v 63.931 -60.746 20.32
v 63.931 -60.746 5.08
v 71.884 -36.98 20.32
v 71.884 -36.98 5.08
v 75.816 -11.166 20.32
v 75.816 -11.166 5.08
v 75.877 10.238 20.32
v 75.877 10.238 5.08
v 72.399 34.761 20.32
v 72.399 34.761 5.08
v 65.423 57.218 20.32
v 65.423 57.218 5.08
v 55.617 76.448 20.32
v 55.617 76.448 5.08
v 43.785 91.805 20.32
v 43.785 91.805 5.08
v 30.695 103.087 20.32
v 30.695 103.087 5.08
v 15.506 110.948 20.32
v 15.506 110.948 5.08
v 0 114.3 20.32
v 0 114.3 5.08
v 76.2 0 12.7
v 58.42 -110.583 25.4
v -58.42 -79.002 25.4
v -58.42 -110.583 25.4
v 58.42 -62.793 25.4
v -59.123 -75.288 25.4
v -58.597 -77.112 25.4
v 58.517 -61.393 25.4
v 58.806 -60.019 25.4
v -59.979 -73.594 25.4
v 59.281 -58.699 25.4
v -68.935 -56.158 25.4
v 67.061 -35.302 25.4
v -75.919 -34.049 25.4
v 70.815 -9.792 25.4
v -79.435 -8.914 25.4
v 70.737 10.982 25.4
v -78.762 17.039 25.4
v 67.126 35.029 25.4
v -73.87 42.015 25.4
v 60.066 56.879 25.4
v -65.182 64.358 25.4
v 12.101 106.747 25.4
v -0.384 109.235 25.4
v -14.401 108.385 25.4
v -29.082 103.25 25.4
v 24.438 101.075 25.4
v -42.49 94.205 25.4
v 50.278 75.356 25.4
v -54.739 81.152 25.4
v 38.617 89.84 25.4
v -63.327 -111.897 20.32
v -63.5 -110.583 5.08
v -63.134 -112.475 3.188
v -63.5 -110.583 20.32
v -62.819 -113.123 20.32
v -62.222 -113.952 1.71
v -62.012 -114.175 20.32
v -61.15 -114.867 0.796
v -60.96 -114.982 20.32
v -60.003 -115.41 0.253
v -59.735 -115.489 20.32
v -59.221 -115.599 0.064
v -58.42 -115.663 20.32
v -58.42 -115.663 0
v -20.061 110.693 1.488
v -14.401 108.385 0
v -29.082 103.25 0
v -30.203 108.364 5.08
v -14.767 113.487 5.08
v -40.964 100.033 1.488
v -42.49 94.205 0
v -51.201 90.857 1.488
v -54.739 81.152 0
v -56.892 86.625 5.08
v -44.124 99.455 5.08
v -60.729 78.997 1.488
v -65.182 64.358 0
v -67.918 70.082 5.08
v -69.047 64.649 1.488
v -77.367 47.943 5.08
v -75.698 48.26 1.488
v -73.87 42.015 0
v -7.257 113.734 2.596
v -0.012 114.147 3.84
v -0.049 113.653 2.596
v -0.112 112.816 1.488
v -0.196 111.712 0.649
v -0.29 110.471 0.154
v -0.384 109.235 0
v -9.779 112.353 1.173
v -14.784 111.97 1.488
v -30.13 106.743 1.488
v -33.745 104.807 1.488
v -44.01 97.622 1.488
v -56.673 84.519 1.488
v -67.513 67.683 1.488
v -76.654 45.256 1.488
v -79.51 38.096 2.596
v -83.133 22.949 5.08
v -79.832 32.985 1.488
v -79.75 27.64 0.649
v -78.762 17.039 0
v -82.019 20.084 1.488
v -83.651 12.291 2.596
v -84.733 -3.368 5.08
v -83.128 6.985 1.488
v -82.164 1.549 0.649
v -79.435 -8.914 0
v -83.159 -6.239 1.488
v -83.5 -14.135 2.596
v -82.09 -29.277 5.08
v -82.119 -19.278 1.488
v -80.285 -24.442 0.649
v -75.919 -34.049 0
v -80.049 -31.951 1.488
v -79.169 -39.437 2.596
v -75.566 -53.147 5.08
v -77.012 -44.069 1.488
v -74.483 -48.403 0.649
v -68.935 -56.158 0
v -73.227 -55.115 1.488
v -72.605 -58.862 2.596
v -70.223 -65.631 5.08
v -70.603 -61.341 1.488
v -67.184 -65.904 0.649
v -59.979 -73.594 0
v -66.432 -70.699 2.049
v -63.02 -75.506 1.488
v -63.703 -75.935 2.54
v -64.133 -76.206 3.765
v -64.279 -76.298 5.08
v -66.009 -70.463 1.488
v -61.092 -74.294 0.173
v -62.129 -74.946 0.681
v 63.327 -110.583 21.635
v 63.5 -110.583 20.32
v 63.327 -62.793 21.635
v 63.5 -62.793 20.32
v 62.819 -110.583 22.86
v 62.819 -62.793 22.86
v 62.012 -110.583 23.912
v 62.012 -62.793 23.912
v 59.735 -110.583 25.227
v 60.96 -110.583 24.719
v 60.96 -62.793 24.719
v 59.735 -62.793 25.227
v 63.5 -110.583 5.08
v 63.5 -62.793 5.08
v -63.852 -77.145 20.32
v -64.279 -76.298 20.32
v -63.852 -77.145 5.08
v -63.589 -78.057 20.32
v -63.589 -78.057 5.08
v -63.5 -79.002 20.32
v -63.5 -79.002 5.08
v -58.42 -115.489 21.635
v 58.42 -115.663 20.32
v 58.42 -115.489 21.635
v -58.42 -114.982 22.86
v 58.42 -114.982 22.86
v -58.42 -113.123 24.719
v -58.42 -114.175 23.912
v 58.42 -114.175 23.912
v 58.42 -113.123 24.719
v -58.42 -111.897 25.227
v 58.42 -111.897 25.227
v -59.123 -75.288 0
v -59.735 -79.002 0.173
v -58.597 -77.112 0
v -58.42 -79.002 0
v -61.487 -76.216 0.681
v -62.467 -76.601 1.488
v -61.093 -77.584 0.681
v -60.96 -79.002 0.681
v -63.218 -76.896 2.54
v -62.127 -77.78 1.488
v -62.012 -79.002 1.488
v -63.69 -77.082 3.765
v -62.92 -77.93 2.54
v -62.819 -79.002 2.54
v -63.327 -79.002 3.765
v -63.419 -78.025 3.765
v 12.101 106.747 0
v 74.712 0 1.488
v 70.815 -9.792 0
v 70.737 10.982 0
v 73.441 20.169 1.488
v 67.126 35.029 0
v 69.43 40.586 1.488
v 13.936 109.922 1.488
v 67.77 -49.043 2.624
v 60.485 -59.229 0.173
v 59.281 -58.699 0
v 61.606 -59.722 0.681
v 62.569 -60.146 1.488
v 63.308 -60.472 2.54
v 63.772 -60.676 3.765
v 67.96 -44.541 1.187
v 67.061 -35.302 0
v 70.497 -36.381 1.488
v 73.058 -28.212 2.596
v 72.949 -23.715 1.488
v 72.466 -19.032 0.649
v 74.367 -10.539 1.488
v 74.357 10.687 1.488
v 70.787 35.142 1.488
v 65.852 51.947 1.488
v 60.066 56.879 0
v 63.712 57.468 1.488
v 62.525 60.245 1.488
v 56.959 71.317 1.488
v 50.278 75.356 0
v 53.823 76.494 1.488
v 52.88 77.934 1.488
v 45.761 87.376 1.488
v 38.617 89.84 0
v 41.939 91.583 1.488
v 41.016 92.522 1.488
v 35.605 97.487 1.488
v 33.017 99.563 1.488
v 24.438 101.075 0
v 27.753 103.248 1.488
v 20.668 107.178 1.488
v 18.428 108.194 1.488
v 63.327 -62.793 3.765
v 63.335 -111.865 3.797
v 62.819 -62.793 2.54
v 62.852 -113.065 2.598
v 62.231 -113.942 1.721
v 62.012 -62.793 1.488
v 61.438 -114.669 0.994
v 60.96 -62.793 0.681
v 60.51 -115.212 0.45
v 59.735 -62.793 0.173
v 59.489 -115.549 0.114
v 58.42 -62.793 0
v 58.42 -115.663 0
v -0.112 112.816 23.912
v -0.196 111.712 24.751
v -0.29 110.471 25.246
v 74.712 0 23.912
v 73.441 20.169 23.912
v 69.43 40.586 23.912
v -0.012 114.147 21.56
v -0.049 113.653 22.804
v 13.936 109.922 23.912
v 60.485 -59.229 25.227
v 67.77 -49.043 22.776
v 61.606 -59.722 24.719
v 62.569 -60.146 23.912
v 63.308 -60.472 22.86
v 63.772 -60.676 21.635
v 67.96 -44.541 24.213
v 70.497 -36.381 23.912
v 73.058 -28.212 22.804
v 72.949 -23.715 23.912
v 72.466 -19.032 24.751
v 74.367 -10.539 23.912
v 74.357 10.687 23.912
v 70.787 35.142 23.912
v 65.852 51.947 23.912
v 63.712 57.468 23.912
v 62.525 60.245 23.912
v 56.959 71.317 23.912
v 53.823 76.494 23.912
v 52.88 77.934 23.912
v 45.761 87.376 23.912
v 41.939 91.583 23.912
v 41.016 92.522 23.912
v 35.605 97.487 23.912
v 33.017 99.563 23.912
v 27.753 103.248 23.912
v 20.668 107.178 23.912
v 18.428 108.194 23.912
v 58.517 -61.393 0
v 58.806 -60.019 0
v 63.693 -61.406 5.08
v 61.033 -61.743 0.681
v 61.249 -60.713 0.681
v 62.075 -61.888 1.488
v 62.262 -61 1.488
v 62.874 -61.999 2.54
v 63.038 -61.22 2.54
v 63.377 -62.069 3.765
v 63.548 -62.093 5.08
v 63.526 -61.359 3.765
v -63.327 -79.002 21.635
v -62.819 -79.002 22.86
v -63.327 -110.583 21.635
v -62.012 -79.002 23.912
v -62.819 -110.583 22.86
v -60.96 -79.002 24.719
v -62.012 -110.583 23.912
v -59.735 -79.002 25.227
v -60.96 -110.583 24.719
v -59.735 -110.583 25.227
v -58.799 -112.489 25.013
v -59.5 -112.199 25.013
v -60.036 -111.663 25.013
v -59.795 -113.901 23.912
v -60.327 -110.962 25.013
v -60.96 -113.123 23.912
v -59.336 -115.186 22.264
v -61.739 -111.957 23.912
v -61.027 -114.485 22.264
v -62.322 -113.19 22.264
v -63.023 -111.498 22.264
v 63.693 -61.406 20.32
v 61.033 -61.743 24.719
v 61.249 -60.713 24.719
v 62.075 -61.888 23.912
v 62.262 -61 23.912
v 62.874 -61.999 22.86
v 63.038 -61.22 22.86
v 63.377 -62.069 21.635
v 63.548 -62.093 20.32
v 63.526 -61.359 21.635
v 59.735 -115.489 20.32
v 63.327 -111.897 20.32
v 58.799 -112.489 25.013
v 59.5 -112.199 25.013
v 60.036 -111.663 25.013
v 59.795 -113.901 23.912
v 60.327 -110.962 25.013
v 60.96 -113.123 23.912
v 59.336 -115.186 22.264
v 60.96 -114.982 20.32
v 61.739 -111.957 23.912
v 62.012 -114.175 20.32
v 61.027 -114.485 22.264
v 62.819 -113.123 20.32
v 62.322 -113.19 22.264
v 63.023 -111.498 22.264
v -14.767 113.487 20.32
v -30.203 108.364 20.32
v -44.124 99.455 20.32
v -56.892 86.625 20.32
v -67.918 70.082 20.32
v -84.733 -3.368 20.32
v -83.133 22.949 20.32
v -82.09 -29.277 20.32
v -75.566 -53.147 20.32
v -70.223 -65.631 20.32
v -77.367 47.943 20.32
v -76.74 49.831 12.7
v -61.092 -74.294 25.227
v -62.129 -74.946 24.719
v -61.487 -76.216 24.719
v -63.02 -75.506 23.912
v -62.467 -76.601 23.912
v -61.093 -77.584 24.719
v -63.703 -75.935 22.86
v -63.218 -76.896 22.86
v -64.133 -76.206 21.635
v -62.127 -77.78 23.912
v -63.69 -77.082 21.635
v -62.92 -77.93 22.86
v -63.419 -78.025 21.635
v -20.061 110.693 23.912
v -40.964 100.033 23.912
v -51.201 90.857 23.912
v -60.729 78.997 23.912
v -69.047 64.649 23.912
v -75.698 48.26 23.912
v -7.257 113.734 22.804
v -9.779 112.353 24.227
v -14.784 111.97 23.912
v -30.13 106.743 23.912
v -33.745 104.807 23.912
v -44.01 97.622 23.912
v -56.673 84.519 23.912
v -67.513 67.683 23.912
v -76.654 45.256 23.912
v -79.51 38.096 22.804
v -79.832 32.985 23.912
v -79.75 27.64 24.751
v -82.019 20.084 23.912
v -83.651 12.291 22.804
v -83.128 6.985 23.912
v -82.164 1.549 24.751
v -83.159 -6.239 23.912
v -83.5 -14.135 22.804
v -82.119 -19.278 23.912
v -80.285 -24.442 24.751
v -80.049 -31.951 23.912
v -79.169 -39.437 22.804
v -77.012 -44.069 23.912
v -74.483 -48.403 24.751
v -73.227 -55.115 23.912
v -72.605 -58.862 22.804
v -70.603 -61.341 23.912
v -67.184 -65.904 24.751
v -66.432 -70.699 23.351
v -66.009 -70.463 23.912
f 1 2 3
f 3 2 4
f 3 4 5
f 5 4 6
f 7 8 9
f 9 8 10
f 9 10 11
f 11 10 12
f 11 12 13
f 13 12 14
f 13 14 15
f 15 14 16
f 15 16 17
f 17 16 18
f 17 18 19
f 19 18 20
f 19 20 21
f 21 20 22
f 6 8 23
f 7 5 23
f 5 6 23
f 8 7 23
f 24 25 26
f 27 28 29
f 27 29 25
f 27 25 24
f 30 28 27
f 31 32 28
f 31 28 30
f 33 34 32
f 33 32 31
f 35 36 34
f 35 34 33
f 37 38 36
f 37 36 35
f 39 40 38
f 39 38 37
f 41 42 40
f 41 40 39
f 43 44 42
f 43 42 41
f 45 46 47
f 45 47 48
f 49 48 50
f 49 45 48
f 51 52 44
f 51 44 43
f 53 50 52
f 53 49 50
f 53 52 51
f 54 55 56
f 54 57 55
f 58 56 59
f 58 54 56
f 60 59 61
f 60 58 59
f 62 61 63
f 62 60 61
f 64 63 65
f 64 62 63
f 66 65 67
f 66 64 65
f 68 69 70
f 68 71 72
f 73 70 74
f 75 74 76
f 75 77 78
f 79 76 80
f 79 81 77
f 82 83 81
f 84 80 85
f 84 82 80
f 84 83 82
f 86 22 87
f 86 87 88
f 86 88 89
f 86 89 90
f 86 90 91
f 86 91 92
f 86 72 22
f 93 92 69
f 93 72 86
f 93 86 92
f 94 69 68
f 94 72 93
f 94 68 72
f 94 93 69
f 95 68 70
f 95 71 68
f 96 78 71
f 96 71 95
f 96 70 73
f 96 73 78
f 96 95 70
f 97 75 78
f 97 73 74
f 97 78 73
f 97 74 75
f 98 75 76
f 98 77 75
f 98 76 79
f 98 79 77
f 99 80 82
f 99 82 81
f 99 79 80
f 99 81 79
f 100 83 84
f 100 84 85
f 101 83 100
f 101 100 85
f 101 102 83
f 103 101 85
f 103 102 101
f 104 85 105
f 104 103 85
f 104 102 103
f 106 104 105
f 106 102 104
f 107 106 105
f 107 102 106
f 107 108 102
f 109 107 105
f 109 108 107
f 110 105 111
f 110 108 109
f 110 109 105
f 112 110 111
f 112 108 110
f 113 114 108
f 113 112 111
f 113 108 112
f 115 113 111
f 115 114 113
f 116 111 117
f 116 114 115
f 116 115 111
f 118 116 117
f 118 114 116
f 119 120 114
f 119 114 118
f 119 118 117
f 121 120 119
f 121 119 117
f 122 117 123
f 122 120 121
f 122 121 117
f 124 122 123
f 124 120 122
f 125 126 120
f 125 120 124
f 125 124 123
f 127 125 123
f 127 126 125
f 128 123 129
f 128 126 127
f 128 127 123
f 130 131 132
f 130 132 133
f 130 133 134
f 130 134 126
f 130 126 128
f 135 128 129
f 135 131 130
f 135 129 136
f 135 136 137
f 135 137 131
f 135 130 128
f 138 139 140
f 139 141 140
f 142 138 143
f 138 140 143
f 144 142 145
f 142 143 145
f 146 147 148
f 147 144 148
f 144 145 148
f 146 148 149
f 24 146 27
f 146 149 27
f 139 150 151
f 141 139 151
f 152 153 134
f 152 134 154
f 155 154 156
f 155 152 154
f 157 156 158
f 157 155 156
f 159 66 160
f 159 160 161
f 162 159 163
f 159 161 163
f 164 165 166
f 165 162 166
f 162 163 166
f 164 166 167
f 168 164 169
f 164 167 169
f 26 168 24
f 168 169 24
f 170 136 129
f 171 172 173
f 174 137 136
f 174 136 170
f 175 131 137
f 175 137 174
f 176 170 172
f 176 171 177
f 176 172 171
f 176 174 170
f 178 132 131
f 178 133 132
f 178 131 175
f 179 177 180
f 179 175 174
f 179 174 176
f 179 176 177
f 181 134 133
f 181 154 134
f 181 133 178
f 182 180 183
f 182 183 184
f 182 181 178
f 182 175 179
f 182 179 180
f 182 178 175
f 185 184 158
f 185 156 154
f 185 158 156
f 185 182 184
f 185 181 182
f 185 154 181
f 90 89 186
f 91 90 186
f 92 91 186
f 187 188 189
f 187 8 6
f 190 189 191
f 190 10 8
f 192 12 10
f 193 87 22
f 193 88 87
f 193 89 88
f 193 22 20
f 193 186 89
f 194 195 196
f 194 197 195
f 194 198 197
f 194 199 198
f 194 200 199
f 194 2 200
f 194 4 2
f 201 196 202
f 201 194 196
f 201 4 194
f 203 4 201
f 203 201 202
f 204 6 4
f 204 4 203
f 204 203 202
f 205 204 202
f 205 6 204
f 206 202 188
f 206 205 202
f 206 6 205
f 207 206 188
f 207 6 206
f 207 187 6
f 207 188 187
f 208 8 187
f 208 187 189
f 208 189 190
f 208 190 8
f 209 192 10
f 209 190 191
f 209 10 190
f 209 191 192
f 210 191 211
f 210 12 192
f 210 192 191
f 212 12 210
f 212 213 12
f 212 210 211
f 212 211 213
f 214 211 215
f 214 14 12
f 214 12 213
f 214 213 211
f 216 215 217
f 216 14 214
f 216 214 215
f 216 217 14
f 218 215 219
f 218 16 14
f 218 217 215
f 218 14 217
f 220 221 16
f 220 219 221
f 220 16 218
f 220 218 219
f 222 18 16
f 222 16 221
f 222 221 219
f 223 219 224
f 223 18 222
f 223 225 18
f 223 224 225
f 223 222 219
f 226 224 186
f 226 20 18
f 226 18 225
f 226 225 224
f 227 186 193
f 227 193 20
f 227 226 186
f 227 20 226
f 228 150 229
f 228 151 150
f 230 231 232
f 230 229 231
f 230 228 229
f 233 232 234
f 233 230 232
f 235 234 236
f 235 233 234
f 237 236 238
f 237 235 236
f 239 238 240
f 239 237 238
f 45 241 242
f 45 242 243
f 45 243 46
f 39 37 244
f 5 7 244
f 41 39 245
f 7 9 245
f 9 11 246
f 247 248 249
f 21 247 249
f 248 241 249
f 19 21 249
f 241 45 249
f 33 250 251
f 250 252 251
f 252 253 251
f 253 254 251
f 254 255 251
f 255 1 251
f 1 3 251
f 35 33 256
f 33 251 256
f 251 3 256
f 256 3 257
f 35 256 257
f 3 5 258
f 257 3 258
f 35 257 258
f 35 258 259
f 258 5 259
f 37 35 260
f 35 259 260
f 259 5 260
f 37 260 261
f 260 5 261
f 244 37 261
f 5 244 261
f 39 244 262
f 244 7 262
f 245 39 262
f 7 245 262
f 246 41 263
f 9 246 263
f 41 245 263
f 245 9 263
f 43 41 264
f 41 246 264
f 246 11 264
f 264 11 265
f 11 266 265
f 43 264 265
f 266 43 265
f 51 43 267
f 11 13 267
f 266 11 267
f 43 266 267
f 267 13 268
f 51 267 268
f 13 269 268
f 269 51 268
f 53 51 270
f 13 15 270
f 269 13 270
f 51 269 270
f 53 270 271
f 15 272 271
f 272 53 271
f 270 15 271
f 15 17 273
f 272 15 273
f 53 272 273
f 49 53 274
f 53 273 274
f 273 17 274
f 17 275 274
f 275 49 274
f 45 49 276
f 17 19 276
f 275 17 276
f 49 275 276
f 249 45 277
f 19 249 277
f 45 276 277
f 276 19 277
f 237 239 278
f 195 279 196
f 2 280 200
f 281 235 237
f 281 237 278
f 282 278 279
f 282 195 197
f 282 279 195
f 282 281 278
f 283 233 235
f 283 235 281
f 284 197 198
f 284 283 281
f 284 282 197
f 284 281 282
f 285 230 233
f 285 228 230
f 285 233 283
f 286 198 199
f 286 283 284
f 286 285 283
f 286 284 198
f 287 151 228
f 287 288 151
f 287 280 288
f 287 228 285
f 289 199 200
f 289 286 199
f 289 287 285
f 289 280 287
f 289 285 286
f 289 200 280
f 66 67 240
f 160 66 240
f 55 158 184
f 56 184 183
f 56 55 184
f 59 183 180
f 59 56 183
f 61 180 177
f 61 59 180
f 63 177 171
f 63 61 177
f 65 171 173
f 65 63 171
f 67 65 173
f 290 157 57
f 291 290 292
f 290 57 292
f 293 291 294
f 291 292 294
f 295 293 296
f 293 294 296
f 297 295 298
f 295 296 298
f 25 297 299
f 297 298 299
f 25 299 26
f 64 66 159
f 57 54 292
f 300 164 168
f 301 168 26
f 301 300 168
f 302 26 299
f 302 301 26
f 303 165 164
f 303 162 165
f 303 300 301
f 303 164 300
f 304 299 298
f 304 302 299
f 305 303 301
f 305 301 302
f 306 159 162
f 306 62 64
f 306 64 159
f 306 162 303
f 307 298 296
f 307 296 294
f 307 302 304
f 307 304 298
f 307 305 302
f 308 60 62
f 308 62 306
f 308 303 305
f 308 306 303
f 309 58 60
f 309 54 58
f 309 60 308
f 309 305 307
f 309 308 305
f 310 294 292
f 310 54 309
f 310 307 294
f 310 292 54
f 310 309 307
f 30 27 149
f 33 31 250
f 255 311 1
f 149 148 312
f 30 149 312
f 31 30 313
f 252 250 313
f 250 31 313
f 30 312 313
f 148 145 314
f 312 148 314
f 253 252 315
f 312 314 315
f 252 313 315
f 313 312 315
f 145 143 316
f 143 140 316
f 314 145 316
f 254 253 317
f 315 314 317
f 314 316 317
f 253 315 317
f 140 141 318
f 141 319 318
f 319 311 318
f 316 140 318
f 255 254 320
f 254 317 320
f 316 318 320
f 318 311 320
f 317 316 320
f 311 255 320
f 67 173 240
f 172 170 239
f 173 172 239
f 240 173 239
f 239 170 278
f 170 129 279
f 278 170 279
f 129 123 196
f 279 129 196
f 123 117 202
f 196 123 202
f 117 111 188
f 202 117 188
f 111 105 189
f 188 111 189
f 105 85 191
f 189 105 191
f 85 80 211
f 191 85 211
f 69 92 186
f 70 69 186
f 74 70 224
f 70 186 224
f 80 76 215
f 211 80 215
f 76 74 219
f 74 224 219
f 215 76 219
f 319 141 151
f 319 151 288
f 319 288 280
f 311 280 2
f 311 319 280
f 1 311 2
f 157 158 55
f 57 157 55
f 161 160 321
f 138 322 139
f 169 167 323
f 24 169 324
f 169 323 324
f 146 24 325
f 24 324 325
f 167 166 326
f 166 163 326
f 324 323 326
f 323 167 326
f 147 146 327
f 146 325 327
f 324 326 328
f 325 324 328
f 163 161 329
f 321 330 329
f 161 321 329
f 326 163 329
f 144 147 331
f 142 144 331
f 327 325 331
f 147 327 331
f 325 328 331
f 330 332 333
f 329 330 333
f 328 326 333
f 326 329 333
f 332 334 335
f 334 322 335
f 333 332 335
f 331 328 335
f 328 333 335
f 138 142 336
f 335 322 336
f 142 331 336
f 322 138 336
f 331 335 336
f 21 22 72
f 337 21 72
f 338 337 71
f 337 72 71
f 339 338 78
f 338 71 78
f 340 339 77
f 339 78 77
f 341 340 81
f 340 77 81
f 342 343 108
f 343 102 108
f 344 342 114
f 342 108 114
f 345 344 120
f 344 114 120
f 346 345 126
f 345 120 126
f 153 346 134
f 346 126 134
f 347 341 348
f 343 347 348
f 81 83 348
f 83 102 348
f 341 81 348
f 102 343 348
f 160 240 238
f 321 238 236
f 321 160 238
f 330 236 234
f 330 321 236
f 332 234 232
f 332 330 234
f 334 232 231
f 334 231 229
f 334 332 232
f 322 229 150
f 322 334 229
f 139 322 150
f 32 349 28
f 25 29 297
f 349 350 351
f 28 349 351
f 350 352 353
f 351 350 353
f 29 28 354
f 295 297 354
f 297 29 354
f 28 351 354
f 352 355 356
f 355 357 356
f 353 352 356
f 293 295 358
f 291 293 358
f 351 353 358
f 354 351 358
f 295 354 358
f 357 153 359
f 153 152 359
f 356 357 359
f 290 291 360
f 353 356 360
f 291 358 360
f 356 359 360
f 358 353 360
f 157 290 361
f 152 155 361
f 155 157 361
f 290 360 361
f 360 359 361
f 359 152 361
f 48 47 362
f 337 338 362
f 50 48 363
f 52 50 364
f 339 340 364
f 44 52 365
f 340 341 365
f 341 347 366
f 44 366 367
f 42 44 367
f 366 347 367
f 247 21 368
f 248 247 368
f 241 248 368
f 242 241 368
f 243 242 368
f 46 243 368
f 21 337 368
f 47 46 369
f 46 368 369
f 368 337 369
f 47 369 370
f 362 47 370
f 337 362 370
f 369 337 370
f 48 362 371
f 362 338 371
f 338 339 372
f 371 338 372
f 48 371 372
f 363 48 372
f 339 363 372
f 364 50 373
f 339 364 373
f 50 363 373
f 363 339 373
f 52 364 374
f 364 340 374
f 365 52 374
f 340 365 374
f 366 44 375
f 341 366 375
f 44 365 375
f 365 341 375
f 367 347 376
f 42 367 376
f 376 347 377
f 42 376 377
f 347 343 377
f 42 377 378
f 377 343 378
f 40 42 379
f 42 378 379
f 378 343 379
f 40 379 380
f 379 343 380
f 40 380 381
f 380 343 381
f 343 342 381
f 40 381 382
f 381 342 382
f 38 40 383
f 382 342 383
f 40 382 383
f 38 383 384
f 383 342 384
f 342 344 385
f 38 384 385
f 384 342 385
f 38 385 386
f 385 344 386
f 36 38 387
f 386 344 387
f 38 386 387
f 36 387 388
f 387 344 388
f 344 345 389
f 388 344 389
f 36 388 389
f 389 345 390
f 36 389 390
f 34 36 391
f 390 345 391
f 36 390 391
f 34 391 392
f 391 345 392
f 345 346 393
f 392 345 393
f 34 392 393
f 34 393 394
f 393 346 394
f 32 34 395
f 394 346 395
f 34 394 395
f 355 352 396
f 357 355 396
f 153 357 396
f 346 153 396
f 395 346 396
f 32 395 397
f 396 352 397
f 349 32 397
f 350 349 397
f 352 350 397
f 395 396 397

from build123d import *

# Parameters (mm, degrees)
F1_DEPTH = 25.4
F2_R     = 5.08


with BuildPart() as f1:
    # F0 (on Top) → F1 (new body)
    with BuildSketch(Plane.XY):
        with BuildLine():
            Line((76.2, 0), (0, 0))
            Line((0, 0), (0, 114.3))
            add(Edge.make_bspline(
                [(0, 114.3), (-197.334433, 129.25868), (-63.5, -77.519546)],
                knots=[6.229935, 6.229935, 6.229935, 8.598, 8.598, 8.598], degree=2, weights=[1, 0.377193, 1]))
            Line((-63.5, -77.519546), (-63.5, -36.650248))
            Line((-63.5, -36.650248), (63.5, -36.650248))
            Line((63.5, -36.650248), (63.5, -61.713303))
            add(Edge.make_bspline(
                [(63.5, -61.713303), (76.2, -33.499707), (76.2, 0)],
                knots=[4.142951, 4.142951, 4.142951, 4.712389, 4.712389, 4.712389], degree=2, weights=[1, 0.959741, 1]))
        make_face()
        with BuildLine():
            Line((0, 114.3), (0, 0))
            Line((0, 0), (76.2, 0))
            add(Edge.make_bspline(
                [(76.2, 0), (76.2, 108.523758), (0, 114.3)],
                knots=[4.712389, 4.712389, 4.712389, 6.229935, 6.229935, 6.229935], degree=2, weights=[1, 0.725681, 1]))
        make_face()
        with BuildLine():
            Line((63.5, -115.662508), (63.5, -61.713303))
            add(Edge.make_bspline(
                [(-63.5, -77.519546), (7.208762, -186.766711), (63.5, -61.713303)],
                knots=[2.314815, 2.314815, 2.314815, 4.142951, 4.142951, 4.142951], degree=2, weights=[1, 0.610529, 1]))
            Line((-63.5, -77.519546), (-63.5, -115.662508))
            Line((-63.5, -115.662508), (63.5, -115.662508))
        make_face()
        with BuildLine():
            add(Edge.make_bspline(
                [(-63.5, -77.519546), (7.208762, -186.766711), (63.5, -61.713303)],
                knots=[2.314815, 2.314815, 2.314815, 4.142951, 4.142951, 4.142951], degree=2, weights=[1, 0.610529, 1]))
            Line((63.5, -61.713303), (63.5, -36.650248))
            Line((63.5, -36.650248), (-63.5, -36.650248))
            Line((-63.5, -36.650248), (-63.5, -77.519546))
        make_face()
    extrude(amount=F1_DEPTH)

    # F2
    f2_edges = [f1.edges().sort_by_distance(p)[0] for p in [
        (63.5, -115.662508, 12.7),
        (-63.5, -115.662508, 12.7),
        (-80.161297, 38.167571, 0),
        (-80.161297, 38.167571, 25.4),
        (0, -115.662508, 25.4),
        (-63.5, -96.591027, 0),
        (-63.5, -96.591027, 25.4),
        (63.5, -61.713303, 12.7),
        (-63.5, -77.519546, 12.7),
        (63.5, -88.687906, 0),
        (63.5, -88.687906, 25.4),
    ]]
    fillet(f2_edges, radius=F2_R)


solid = f1.part
